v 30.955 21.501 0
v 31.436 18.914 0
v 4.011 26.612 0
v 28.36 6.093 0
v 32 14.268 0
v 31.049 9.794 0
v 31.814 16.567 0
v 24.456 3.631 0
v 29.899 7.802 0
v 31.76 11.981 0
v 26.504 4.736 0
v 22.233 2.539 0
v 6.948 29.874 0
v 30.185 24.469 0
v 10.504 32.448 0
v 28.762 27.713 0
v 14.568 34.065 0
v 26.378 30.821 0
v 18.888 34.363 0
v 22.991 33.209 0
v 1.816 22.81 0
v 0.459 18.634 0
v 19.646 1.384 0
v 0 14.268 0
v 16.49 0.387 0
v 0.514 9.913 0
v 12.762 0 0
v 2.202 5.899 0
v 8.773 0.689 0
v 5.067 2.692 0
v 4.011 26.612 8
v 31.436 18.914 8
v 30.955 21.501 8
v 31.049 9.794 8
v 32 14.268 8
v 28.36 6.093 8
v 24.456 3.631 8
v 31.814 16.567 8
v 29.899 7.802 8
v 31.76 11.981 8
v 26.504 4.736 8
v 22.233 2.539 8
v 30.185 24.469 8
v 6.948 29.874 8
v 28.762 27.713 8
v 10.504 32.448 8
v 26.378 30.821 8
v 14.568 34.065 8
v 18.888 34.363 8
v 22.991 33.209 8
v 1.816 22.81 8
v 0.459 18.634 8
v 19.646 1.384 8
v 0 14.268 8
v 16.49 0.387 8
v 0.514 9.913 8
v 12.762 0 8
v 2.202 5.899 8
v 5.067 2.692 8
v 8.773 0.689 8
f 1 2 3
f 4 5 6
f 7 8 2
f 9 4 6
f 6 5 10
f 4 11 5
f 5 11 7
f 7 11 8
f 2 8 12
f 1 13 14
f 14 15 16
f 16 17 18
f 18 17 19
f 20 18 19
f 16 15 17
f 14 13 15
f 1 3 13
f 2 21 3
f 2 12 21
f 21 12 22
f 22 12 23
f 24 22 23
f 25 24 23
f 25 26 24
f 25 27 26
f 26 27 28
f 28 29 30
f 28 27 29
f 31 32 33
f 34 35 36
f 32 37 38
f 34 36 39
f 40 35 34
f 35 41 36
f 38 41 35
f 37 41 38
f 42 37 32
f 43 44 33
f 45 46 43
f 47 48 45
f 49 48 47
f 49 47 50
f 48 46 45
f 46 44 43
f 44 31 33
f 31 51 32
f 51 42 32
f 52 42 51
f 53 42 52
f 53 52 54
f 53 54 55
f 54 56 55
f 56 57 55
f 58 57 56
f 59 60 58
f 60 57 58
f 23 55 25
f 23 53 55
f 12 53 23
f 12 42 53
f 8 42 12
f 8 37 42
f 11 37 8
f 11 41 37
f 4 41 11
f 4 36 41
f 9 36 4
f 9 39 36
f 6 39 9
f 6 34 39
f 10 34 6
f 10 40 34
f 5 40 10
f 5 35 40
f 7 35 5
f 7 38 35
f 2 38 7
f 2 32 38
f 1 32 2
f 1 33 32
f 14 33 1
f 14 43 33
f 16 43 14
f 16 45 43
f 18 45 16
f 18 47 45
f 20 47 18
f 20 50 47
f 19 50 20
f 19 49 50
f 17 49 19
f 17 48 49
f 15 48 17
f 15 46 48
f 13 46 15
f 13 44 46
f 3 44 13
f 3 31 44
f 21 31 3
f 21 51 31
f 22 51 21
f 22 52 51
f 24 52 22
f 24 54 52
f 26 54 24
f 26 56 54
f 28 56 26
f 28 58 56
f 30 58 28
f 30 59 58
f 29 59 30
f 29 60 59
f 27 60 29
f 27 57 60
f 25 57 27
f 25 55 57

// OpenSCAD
$fn = 32;

// ----------------------------------------------------------------------
// Cam disc: base radius 11.0 mm, lift 10.0 mm, 30 profile points
// ----------------------------------------------------------------------

// --- parameters (mm) ---
profile_height = 8;       // extrusion height
profile_points = 30;      // points of the closed outline

profile = [[32, 14.268], [31.814, 16.567], [31.436, 18.914], [30.955, 21.501], [30.185, 24.469], [28.762, 27.713], [26.378, 30.821], [22.991, 33.209], [18.888, 34.363], [14.568, 34.065], [10.504, 32.448], [6.948, 29.874], [4.011, 26.612], [1.816, 22.81], [0.459, 18.634], [0, 14.268], [0.514, 9.913], [2.202, 5.899], [5.067, 2.692], [8.773, 0.689], [12.762, 0], [16.49, 0.387], [19.646, 1.384], [22.233, 2.539], [24.456, 3.631], [26.504, 4.736], [28.36, 6.093], [29.899, 7.802], [31.049, 9.794], [31.76, 11.981]];  // single closed polygon, 30 points, counter clockwise

// --- the one profile operation ---
linear_extrude(height = profile_height) polygon(points = profile);
